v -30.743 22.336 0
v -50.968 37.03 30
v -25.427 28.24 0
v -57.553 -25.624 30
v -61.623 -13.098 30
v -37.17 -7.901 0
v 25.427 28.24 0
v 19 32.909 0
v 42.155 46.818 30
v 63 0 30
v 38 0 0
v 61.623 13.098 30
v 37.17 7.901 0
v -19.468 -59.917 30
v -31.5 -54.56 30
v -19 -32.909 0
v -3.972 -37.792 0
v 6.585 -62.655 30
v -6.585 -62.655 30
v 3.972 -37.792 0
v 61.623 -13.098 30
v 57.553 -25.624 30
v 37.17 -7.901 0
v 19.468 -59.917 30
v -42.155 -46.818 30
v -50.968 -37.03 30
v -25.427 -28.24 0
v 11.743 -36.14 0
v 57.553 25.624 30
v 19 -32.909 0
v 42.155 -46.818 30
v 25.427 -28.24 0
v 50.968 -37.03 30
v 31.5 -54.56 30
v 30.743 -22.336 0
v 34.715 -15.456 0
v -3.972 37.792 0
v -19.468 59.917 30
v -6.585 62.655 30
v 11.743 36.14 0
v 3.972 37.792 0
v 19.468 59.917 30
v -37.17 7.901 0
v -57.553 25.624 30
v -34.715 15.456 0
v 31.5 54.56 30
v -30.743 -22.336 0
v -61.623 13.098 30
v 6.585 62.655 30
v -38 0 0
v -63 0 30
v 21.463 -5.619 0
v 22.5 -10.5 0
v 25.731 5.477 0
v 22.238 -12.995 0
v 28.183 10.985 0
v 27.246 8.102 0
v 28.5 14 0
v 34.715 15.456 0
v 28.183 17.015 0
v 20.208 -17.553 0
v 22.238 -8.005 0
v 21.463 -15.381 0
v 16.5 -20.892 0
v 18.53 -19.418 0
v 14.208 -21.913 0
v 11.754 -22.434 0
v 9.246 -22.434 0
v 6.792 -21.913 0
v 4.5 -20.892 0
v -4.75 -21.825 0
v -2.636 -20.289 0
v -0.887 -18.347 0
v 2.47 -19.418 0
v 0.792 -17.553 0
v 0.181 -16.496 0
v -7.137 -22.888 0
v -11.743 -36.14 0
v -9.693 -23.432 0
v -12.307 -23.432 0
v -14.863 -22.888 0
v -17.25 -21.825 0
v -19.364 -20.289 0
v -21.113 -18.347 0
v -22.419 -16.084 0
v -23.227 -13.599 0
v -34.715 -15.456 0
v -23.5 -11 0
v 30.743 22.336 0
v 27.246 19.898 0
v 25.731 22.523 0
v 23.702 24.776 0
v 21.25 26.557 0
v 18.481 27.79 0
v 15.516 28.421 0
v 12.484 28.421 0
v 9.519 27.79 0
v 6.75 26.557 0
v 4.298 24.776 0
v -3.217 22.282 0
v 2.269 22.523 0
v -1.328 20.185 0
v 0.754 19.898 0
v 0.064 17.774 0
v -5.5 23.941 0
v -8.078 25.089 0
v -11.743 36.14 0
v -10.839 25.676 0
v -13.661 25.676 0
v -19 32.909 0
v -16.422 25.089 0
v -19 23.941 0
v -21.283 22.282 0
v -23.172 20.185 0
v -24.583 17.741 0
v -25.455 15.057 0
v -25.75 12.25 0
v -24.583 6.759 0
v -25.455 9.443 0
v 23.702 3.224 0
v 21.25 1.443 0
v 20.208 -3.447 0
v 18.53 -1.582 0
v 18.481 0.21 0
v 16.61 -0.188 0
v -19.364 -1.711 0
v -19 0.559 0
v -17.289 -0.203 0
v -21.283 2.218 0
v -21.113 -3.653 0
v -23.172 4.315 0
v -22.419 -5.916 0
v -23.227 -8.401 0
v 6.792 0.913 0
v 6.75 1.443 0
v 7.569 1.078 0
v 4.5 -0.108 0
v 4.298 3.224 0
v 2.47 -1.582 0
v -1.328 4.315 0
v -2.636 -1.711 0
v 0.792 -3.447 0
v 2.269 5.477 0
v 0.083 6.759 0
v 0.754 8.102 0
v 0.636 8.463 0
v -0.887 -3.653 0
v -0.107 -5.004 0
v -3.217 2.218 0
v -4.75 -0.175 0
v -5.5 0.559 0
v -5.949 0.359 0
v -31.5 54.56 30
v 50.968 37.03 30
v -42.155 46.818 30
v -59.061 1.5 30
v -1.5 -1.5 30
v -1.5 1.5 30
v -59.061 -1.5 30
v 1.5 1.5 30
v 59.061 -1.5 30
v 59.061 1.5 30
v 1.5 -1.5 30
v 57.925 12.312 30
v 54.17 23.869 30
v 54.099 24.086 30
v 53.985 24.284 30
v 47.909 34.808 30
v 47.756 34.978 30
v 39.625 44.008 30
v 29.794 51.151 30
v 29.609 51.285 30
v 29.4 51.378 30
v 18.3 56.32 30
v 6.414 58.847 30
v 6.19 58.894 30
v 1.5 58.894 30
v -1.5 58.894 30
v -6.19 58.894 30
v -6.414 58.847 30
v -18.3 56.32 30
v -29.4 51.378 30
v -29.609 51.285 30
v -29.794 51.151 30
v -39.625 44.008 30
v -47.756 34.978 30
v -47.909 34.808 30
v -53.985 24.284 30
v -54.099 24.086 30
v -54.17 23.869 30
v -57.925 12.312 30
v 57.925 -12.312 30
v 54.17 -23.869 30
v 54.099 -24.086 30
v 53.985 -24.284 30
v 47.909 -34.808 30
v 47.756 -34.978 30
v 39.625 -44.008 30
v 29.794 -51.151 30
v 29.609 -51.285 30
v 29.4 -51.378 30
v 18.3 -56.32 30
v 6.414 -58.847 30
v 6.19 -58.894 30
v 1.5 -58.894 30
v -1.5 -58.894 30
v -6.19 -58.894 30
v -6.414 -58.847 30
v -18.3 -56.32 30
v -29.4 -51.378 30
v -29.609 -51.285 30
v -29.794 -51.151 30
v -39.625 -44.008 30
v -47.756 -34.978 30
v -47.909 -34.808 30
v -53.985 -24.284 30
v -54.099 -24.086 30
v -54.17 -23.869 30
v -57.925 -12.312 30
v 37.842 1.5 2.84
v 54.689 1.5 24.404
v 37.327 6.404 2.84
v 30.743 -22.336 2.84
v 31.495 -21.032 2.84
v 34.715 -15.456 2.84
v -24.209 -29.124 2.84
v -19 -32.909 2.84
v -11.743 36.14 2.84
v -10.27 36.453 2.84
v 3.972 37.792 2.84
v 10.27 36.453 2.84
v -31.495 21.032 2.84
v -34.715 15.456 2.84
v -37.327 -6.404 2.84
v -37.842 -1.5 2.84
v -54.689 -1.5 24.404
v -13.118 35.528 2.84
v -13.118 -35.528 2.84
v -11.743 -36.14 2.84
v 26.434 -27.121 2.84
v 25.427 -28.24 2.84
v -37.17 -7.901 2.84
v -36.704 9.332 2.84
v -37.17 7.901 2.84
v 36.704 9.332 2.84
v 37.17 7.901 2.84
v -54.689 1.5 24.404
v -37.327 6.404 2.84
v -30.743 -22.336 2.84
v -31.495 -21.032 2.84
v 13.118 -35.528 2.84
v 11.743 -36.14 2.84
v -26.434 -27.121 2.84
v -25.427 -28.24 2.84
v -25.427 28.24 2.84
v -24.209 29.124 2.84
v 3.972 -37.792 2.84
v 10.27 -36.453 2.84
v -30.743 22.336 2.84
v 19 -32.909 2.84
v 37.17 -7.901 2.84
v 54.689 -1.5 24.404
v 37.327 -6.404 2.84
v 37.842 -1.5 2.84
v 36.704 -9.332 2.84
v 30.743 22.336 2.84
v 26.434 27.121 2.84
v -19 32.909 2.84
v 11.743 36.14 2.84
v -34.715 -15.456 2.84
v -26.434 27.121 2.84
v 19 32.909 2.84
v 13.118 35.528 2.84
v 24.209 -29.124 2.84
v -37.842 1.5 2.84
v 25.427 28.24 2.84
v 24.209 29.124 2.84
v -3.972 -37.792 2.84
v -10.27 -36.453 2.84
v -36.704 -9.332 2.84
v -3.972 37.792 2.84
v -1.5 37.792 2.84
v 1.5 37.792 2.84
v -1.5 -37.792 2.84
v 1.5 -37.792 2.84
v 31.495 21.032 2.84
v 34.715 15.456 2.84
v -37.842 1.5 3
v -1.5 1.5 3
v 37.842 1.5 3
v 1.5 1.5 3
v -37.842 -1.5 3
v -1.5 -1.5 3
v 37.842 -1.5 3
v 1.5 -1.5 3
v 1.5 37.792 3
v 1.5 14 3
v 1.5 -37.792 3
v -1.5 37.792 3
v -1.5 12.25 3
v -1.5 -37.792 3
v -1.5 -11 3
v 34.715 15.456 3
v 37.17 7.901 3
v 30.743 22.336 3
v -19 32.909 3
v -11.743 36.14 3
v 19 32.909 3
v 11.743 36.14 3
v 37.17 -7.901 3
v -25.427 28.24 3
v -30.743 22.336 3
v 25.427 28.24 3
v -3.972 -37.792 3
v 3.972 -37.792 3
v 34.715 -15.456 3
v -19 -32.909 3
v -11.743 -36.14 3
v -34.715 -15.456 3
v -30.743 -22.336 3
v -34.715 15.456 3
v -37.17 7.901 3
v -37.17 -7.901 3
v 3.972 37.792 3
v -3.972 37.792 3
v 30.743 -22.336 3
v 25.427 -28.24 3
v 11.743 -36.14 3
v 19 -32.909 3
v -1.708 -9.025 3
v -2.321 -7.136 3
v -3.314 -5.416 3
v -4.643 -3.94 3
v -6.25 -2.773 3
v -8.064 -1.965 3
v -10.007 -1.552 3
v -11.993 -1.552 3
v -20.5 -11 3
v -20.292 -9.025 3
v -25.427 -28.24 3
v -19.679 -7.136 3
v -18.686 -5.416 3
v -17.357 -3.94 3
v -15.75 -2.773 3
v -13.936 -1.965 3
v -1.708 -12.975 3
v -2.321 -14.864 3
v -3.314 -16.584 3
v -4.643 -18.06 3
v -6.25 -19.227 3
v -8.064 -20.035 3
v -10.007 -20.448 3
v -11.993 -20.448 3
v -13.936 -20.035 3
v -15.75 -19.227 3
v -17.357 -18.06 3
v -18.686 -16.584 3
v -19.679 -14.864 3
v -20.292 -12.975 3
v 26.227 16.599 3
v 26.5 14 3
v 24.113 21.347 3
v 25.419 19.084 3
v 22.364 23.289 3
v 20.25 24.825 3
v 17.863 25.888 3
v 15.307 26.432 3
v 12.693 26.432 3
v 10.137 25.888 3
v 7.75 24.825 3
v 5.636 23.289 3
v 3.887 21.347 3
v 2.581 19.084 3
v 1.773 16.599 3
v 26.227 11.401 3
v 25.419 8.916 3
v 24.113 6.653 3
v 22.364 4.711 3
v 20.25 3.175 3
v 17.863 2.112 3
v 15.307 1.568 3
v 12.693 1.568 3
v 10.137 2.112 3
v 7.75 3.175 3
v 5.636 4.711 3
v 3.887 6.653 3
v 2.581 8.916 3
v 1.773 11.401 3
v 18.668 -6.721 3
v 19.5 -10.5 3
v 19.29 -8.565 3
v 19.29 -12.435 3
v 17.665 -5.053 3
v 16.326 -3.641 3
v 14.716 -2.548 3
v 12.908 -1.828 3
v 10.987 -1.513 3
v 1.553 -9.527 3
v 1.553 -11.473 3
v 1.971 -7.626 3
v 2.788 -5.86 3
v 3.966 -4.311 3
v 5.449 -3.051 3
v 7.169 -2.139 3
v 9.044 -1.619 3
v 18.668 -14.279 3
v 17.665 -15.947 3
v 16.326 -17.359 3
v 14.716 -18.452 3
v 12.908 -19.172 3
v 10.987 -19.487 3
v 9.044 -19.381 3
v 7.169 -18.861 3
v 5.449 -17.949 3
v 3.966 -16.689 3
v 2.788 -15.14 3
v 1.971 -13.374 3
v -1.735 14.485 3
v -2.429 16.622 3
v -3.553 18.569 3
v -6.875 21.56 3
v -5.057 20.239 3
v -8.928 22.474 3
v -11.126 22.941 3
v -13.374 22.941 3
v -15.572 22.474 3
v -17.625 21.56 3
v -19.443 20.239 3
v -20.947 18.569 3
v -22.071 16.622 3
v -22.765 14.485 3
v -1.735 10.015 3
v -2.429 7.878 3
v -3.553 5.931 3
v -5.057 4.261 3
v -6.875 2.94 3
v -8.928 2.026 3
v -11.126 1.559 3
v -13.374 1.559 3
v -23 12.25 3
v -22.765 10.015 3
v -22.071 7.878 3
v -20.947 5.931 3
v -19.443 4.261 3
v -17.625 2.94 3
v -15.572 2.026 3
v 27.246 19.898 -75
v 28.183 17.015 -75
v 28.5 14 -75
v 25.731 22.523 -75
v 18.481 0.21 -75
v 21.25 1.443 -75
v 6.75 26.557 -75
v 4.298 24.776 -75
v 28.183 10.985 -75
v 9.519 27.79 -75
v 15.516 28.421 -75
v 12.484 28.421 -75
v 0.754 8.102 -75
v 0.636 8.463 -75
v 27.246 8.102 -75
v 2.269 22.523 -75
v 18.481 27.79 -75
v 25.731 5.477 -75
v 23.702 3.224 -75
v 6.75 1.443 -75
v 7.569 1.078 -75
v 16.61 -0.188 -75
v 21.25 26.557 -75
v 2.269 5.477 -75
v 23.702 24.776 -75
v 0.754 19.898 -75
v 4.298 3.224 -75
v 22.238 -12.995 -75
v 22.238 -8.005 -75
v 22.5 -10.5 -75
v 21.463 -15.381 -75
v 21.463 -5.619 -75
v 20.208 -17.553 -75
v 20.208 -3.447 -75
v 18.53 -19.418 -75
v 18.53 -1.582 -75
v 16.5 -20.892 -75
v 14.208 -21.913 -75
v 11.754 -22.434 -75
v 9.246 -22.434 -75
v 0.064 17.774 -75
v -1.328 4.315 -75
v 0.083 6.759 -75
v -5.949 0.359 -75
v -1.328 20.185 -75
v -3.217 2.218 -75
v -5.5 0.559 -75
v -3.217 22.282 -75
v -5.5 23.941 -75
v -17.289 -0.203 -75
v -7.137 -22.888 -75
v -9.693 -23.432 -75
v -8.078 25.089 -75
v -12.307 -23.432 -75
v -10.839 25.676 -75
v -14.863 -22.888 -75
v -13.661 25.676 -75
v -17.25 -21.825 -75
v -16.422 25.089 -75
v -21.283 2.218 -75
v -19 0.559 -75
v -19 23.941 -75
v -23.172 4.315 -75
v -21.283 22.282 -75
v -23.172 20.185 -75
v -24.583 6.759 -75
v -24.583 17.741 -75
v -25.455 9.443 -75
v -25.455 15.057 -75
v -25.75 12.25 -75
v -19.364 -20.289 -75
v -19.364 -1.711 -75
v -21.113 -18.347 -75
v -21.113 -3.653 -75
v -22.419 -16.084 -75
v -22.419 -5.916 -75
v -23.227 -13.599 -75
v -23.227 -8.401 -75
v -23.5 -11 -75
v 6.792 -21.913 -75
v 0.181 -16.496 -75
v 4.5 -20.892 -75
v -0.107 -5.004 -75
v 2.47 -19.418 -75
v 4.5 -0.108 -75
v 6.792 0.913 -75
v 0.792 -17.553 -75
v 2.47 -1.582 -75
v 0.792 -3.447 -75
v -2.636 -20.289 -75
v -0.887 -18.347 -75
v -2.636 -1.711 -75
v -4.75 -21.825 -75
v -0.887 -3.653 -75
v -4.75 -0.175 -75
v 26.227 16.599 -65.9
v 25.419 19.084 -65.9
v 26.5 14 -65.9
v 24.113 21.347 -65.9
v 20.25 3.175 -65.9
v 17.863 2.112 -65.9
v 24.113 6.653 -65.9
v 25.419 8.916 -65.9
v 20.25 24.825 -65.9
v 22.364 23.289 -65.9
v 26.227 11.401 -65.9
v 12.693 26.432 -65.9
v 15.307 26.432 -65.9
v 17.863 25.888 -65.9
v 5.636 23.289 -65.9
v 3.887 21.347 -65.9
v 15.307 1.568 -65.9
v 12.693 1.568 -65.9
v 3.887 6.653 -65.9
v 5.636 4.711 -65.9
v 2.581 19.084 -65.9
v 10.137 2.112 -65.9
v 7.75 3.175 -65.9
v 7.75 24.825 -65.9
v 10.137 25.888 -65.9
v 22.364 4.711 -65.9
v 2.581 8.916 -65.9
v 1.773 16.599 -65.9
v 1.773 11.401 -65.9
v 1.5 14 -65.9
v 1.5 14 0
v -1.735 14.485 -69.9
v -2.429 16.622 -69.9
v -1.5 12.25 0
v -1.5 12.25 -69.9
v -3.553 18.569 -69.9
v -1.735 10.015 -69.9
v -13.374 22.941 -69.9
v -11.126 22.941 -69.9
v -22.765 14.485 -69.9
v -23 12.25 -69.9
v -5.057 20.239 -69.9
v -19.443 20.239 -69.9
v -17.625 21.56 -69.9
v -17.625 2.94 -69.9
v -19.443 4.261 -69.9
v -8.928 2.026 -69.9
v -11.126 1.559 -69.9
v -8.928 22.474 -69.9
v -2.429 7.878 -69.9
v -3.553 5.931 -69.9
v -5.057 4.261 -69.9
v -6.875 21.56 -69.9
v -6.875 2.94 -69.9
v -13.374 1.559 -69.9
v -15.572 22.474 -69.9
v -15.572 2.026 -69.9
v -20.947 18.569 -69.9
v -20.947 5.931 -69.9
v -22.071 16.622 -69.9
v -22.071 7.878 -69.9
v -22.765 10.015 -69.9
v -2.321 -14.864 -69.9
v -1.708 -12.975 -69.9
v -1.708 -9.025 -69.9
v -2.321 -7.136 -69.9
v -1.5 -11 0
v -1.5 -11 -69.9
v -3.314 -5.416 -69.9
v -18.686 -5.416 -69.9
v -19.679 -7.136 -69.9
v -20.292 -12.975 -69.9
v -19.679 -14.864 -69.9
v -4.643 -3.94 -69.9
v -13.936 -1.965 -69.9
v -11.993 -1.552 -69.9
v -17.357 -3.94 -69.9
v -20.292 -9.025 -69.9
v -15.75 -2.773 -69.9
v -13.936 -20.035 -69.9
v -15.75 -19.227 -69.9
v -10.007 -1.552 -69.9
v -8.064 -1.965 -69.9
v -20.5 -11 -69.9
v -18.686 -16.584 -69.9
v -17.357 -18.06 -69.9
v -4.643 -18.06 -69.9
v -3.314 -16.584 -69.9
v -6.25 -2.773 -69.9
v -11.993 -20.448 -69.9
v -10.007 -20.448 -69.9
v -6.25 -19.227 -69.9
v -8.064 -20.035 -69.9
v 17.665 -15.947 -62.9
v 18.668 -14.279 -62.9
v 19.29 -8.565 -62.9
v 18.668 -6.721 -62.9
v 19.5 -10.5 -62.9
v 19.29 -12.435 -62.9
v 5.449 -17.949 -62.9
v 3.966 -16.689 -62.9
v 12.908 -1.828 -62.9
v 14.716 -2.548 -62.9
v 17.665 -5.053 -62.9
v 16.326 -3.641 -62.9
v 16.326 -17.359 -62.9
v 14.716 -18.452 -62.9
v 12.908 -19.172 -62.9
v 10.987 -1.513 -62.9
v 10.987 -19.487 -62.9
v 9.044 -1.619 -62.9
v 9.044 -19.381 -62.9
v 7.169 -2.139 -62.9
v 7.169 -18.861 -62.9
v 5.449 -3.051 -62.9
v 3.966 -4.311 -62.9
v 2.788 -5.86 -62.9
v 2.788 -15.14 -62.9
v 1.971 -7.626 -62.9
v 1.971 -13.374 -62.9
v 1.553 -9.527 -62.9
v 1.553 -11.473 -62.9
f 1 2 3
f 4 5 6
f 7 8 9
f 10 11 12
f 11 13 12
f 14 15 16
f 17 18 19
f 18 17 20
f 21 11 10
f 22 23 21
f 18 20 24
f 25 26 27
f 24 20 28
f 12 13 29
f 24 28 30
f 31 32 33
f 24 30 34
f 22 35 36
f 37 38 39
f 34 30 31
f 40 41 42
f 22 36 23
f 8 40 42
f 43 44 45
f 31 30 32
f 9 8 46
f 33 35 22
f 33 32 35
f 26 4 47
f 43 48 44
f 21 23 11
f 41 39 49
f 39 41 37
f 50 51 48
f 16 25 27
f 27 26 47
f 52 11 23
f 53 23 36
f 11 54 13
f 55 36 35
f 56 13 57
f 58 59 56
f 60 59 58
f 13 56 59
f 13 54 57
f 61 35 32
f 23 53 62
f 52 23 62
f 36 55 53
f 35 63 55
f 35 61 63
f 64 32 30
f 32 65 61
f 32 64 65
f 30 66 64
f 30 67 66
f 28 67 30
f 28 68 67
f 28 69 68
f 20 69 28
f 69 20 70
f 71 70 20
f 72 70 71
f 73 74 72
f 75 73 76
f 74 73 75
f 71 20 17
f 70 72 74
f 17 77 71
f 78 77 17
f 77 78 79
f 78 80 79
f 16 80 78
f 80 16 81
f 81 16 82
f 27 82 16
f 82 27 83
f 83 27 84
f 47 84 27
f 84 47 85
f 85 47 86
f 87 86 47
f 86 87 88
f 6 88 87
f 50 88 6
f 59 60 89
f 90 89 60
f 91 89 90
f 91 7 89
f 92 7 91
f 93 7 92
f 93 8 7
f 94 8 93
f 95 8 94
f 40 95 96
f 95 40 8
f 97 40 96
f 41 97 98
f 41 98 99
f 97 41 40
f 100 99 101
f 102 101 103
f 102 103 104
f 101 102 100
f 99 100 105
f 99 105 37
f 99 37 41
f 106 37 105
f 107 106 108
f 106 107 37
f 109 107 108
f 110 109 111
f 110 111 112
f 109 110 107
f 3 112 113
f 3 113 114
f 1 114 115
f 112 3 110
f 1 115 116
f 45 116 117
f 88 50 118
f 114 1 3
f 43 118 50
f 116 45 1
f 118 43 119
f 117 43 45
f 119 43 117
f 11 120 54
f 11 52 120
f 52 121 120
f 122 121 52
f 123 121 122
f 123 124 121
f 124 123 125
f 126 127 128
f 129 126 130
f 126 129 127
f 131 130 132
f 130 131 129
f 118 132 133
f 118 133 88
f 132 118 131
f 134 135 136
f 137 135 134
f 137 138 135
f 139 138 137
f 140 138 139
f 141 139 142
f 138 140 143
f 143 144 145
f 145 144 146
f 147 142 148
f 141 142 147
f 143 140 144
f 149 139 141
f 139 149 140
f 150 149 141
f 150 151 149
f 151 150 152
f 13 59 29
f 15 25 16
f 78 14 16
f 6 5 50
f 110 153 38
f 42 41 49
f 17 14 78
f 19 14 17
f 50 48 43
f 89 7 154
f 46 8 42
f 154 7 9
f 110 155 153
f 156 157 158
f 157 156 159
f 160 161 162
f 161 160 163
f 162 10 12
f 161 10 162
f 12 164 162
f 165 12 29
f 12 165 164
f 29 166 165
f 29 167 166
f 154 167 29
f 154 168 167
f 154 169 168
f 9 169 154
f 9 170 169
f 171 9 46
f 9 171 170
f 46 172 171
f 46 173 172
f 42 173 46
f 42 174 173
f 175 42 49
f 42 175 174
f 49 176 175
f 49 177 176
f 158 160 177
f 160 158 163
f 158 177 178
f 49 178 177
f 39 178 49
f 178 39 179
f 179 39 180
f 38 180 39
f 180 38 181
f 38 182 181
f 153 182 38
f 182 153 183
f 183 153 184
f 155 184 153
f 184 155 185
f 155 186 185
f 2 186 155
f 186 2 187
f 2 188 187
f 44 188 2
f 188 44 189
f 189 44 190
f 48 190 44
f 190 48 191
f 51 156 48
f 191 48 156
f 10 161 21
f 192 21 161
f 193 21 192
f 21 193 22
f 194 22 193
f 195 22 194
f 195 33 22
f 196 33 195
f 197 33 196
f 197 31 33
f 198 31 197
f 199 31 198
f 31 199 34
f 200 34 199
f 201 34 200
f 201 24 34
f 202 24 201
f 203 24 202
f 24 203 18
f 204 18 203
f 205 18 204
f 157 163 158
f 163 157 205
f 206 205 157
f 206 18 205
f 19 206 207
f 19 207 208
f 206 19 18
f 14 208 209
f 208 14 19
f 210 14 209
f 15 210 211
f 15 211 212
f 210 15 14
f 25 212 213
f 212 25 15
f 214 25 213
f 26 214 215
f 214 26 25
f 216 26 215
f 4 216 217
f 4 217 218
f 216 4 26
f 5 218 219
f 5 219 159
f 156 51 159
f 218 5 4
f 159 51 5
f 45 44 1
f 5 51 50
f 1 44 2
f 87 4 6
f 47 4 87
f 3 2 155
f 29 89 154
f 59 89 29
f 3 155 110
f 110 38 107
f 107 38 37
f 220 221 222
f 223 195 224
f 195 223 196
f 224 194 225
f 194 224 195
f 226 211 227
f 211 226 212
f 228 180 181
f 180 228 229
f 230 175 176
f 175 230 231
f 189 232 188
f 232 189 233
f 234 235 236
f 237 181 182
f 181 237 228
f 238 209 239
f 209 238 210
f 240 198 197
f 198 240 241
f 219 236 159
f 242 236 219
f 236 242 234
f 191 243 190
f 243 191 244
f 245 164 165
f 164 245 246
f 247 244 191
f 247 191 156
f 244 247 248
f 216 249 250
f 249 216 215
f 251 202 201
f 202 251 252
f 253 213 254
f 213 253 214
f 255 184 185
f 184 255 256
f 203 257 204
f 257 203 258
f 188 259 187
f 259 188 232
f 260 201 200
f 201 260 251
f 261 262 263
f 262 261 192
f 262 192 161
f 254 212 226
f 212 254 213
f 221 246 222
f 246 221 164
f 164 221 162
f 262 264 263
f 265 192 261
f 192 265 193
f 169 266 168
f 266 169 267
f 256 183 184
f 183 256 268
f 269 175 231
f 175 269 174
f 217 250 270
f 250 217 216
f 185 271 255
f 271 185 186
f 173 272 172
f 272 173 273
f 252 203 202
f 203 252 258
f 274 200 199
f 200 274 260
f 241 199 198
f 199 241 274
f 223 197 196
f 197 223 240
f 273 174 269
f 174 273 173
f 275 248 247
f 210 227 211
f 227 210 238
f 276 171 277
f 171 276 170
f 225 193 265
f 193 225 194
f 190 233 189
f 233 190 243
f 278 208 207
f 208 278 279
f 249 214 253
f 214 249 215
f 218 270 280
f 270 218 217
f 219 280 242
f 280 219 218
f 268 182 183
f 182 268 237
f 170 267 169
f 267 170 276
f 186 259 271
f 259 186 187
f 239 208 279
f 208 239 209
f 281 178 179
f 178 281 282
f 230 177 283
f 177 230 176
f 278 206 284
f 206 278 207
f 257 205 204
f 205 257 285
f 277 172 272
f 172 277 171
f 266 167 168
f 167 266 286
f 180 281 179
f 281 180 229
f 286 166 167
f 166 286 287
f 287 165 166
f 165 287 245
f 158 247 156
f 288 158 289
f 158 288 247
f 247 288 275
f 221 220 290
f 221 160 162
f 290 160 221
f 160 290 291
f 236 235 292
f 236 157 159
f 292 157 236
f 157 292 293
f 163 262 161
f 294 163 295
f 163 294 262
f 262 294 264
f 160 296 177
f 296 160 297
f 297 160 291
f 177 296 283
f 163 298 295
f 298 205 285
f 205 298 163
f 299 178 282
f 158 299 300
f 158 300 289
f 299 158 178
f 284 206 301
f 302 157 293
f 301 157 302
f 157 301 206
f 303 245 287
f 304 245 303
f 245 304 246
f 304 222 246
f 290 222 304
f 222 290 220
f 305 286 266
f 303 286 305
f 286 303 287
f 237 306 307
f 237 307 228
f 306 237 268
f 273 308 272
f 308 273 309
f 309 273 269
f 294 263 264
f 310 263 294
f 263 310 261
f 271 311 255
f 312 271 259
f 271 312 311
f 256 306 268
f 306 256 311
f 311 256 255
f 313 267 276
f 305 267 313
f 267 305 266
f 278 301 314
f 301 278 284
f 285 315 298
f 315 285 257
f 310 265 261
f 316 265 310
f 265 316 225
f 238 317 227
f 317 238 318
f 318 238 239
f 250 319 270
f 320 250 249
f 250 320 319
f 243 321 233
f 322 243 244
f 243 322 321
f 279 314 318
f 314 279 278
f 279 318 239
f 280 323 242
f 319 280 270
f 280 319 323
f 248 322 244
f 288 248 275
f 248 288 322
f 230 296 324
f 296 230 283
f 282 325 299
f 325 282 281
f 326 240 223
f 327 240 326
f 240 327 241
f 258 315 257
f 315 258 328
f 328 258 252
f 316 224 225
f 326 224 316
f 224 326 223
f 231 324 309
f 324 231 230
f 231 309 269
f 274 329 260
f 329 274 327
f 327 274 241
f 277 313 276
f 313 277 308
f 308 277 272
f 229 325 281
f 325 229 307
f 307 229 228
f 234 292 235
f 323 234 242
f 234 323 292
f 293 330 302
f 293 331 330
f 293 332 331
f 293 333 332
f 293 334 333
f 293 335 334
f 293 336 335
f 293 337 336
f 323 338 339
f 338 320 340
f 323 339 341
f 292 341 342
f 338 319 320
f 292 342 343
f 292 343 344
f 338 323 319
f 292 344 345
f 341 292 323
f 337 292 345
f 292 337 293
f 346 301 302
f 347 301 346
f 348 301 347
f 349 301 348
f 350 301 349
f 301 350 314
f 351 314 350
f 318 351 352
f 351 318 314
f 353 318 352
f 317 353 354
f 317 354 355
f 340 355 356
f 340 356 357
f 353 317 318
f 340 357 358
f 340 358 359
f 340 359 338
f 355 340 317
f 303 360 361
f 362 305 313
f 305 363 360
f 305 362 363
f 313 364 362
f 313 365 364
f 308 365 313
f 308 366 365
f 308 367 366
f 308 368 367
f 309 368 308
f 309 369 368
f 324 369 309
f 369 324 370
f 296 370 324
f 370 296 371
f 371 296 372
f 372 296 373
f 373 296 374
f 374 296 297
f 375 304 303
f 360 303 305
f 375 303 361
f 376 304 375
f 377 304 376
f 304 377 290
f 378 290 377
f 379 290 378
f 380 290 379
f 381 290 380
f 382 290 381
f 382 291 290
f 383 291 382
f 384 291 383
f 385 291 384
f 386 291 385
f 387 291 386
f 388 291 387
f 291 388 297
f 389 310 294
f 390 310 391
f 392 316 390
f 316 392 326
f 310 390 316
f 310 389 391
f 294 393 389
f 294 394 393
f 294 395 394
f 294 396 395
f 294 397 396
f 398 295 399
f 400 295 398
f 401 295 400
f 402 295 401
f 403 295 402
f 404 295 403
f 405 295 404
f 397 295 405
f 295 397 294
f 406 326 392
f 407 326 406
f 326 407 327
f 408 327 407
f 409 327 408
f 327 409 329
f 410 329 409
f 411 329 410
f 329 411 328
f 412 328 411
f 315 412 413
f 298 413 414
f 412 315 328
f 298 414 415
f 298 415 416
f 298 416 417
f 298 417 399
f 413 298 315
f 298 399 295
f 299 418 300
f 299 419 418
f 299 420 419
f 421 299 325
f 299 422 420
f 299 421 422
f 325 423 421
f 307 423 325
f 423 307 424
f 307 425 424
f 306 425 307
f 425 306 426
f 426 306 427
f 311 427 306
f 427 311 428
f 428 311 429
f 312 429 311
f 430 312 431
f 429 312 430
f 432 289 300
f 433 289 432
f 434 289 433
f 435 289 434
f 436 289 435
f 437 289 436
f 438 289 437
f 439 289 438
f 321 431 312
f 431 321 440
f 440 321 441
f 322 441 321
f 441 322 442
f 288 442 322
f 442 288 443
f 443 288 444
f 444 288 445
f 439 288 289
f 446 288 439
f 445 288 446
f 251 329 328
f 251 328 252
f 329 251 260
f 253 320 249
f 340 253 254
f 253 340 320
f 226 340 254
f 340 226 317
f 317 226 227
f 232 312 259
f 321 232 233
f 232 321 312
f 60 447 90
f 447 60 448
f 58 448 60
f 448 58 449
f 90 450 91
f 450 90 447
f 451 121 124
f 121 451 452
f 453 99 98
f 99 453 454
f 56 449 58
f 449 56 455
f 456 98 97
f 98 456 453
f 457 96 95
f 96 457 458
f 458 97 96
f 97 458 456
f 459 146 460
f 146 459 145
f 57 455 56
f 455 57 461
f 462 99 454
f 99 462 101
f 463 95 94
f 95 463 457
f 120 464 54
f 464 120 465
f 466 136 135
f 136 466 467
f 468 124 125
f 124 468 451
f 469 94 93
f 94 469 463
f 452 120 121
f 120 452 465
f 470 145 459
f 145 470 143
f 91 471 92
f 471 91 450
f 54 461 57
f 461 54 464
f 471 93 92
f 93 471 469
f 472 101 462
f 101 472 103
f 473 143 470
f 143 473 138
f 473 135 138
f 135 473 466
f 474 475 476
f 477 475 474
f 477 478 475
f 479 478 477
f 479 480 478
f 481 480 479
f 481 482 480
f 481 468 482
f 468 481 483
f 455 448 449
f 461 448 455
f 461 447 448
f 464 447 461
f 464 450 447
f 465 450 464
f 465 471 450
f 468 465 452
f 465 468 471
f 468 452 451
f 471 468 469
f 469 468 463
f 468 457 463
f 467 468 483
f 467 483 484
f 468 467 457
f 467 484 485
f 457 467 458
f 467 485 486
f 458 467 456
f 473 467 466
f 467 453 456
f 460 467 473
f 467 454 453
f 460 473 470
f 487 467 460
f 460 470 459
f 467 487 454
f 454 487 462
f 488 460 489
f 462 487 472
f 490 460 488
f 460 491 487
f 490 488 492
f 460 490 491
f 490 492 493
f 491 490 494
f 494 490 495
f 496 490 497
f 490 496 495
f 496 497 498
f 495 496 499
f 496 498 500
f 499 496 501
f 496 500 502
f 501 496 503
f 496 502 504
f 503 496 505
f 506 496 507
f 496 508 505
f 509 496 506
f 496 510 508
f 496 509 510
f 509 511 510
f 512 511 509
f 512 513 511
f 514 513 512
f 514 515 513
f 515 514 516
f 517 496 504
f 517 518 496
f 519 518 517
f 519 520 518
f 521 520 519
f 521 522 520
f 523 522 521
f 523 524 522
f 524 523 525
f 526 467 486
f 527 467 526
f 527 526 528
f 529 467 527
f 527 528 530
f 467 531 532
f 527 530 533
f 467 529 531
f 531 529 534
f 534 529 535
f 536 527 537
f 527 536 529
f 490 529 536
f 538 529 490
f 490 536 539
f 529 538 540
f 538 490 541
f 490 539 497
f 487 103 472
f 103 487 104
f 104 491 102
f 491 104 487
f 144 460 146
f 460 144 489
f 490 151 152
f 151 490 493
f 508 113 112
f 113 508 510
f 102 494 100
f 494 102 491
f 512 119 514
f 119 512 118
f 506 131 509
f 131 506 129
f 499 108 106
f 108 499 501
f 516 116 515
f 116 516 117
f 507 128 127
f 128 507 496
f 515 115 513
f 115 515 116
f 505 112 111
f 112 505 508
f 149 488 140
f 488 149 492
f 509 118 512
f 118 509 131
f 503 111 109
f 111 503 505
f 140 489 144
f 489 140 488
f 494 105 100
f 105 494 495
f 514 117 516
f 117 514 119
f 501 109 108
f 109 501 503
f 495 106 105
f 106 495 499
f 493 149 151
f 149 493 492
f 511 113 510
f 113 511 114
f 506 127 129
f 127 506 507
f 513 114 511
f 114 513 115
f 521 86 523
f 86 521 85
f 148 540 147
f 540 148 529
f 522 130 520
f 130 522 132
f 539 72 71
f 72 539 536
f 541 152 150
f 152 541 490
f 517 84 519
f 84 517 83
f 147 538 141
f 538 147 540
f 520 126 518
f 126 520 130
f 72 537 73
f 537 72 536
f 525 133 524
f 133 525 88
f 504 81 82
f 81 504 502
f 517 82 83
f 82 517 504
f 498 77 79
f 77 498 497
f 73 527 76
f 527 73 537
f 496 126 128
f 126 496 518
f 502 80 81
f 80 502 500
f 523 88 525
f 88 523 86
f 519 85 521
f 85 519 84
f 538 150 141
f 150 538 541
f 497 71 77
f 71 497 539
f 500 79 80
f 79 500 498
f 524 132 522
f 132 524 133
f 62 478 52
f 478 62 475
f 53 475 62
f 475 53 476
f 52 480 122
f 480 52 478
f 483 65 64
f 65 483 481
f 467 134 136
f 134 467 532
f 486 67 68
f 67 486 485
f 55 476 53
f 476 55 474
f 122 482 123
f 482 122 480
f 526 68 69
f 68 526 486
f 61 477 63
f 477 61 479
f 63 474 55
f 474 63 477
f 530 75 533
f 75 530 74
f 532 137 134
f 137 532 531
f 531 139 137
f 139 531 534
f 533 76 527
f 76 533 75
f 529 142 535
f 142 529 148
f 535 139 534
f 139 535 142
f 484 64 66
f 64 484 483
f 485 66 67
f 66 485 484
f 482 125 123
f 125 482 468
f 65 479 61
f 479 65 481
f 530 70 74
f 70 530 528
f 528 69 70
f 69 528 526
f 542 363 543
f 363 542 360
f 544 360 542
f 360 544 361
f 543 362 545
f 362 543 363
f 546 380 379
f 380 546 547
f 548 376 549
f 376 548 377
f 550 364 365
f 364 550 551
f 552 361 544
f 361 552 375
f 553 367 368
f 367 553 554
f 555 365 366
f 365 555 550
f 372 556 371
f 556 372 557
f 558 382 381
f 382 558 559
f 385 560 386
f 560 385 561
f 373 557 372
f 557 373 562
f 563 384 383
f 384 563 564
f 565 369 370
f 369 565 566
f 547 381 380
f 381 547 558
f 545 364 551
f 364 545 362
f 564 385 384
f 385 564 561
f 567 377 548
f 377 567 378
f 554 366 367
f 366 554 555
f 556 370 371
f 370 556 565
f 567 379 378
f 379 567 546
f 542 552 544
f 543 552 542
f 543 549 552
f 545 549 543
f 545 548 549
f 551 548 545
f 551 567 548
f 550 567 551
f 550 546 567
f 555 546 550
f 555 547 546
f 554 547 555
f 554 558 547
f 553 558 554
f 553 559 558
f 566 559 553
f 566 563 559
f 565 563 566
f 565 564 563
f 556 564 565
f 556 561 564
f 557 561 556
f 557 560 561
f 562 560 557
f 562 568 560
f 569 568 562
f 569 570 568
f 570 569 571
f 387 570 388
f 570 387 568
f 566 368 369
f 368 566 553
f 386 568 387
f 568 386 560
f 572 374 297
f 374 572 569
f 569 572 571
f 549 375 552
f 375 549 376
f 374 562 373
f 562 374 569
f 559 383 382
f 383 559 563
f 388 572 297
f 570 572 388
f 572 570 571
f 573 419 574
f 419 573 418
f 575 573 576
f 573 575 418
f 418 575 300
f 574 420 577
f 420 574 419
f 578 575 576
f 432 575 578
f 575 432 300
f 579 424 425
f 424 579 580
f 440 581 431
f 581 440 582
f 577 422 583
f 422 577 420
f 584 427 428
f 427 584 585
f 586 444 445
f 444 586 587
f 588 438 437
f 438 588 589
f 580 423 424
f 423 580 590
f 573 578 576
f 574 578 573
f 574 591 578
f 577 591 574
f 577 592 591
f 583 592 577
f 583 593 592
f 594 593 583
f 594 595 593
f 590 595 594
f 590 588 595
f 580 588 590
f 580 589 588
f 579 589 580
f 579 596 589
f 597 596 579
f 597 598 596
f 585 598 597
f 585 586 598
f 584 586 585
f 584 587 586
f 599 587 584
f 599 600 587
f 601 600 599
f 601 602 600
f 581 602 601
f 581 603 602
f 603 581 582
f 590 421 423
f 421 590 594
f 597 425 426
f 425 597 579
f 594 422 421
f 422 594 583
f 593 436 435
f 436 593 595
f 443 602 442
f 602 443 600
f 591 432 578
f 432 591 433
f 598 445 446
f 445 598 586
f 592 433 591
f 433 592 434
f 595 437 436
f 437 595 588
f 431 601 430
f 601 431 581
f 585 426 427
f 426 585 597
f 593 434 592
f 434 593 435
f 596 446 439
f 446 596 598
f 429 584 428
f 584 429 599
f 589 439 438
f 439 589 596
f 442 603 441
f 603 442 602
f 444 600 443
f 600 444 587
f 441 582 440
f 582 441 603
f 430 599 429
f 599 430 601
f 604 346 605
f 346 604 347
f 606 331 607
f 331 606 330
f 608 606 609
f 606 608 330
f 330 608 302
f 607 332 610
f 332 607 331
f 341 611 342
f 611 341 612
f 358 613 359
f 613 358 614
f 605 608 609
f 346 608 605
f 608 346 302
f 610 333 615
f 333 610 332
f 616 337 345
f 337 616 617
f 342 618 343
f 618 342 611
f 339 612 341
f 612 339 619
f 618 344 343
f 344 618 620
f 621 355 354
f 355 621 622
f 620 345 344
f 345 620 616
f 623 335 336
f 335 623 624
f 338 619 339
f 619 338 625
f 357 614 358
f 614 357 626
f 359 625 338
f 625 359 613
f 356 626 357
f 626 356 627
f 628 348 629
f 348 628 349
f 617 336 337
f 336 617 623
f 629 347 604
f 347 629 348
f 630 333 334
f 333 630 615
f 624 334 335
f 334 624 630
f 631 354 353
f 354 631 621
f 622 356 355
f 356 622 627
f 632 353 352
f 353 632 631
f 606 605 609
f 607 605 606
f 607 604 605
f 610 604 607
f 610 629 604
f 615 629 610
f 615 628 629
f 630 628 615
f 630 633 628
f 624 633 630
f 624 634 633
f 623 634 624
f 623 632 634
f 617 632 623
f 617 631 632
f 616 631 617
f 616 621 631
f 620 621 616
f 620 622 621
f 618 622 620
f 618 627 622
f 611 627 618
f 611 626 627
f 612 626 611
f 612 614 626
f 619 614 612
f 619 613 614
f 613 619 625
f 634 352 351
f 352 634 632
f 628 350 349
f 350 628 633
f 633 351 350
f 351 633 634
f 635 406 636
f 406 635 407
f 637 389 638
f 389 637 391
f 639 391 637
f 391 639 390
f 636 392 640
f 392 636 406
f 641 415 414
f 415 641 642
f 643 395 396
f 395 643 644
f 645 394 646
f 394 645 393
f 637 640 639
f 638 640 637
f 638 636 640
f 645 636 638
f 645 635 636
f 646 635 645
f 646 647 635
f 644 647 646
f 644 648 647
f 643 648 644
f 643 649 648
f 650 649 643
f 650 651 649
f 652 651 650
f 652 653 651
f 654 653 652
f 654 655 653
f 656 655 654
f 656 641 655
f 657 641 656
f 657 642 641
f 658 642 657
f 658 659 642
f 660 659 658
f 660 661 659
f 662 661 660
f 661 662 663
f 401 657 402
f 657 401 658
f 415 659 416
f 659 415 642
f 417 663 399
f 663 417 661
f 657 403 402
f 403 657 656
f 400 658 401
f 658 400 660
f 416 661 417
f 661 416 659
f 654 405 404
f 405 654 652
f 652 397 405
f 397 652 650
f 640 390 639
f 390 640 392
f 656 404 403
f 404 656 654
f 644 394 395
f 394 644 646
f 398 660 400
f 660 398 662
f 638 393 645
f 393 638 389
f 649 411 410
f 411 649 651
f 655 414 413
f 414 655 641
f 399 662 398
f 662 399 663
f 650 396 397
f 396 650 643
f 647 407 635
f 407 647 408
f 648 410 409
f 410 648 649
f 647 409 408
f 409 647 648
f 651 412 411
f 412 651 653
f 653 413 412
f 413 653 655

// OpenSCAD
DQ=25; //diameter of quarters
HQ=69; //height of $10 of quarters

DN=21.5; //diameter of nickles
HN=73; //height of $2 of nickles

DP=19; //diameter of pennies
HP=73; //height of $.5 of pennies

DD=18; //diameter of dimes
HD=66; //height of $5 of dimes

union() {
 difference() {
 cylinder(h=30, r1=38, r2=63, center=false);
 translate([0,0,-1])
 cylinder(h=32, r1=35, r2=60, center=false);
 } //catcher cone
 
 
 intersection() {
 cylinder(h=30, r1=38, r2=63, center=false);
 
 translate([0,0,15])
 cube(size = [125,3,30], center = true);
 }
 intersection() {
 cylinder(h=30, r1=38, r2=63, center=false);
  
 translate([0,0,15])
 cube(size = [3,125,30], center = true);
 }
  // dividers
 
 difference() {
 union() {
 cylinder(h=3, r=38, center=false);

 translate([(DQ/2)+1.5,(DQ/2)+1.5,-75])
 cylinder(h=75, r=(DQ+4)/2, center=false); //.25
 
 translate([-(DN/2)-1.5,(DN/2)+1.5,-75])
 cylinder(h=75, r=13.5, center=false); //.5
 
 translate([-(DP/2)-1.5,-(DP/2)-1.5,-75])
 cylinder(h=75, r=12.5, center=false); //.01
 
 translate([(DD/2)+1.5,-(DD/2)-1.5,-75])
 cylinder(h=75, r=12, center=false); //.1
 } //outer
 translate([(DQ/2)+1.5,(DQ/2)+1.5,-HQ+3.1])
 cylinder(h=HQ, r=DQ/2, center=false); //.25
 
 translate([-(DN/2)-1.5,(DN/2)+1.5,-HN+3.1])
 cylinder(h=HN, r=DN/2, center=false); //.5
 
 translate([-(DP/2)-1.5,-(DP/2)-1.5,-HP+3.1])
 cylinder(h=HP, r=DP/2, center=false); //.01
 
 translate([(DD/2)+1.5,-(DD/2)-1.5,-HD+3.1])
 cylinder(h=HD, r=DD/2, center=false); //.1
 } //inner
 }
